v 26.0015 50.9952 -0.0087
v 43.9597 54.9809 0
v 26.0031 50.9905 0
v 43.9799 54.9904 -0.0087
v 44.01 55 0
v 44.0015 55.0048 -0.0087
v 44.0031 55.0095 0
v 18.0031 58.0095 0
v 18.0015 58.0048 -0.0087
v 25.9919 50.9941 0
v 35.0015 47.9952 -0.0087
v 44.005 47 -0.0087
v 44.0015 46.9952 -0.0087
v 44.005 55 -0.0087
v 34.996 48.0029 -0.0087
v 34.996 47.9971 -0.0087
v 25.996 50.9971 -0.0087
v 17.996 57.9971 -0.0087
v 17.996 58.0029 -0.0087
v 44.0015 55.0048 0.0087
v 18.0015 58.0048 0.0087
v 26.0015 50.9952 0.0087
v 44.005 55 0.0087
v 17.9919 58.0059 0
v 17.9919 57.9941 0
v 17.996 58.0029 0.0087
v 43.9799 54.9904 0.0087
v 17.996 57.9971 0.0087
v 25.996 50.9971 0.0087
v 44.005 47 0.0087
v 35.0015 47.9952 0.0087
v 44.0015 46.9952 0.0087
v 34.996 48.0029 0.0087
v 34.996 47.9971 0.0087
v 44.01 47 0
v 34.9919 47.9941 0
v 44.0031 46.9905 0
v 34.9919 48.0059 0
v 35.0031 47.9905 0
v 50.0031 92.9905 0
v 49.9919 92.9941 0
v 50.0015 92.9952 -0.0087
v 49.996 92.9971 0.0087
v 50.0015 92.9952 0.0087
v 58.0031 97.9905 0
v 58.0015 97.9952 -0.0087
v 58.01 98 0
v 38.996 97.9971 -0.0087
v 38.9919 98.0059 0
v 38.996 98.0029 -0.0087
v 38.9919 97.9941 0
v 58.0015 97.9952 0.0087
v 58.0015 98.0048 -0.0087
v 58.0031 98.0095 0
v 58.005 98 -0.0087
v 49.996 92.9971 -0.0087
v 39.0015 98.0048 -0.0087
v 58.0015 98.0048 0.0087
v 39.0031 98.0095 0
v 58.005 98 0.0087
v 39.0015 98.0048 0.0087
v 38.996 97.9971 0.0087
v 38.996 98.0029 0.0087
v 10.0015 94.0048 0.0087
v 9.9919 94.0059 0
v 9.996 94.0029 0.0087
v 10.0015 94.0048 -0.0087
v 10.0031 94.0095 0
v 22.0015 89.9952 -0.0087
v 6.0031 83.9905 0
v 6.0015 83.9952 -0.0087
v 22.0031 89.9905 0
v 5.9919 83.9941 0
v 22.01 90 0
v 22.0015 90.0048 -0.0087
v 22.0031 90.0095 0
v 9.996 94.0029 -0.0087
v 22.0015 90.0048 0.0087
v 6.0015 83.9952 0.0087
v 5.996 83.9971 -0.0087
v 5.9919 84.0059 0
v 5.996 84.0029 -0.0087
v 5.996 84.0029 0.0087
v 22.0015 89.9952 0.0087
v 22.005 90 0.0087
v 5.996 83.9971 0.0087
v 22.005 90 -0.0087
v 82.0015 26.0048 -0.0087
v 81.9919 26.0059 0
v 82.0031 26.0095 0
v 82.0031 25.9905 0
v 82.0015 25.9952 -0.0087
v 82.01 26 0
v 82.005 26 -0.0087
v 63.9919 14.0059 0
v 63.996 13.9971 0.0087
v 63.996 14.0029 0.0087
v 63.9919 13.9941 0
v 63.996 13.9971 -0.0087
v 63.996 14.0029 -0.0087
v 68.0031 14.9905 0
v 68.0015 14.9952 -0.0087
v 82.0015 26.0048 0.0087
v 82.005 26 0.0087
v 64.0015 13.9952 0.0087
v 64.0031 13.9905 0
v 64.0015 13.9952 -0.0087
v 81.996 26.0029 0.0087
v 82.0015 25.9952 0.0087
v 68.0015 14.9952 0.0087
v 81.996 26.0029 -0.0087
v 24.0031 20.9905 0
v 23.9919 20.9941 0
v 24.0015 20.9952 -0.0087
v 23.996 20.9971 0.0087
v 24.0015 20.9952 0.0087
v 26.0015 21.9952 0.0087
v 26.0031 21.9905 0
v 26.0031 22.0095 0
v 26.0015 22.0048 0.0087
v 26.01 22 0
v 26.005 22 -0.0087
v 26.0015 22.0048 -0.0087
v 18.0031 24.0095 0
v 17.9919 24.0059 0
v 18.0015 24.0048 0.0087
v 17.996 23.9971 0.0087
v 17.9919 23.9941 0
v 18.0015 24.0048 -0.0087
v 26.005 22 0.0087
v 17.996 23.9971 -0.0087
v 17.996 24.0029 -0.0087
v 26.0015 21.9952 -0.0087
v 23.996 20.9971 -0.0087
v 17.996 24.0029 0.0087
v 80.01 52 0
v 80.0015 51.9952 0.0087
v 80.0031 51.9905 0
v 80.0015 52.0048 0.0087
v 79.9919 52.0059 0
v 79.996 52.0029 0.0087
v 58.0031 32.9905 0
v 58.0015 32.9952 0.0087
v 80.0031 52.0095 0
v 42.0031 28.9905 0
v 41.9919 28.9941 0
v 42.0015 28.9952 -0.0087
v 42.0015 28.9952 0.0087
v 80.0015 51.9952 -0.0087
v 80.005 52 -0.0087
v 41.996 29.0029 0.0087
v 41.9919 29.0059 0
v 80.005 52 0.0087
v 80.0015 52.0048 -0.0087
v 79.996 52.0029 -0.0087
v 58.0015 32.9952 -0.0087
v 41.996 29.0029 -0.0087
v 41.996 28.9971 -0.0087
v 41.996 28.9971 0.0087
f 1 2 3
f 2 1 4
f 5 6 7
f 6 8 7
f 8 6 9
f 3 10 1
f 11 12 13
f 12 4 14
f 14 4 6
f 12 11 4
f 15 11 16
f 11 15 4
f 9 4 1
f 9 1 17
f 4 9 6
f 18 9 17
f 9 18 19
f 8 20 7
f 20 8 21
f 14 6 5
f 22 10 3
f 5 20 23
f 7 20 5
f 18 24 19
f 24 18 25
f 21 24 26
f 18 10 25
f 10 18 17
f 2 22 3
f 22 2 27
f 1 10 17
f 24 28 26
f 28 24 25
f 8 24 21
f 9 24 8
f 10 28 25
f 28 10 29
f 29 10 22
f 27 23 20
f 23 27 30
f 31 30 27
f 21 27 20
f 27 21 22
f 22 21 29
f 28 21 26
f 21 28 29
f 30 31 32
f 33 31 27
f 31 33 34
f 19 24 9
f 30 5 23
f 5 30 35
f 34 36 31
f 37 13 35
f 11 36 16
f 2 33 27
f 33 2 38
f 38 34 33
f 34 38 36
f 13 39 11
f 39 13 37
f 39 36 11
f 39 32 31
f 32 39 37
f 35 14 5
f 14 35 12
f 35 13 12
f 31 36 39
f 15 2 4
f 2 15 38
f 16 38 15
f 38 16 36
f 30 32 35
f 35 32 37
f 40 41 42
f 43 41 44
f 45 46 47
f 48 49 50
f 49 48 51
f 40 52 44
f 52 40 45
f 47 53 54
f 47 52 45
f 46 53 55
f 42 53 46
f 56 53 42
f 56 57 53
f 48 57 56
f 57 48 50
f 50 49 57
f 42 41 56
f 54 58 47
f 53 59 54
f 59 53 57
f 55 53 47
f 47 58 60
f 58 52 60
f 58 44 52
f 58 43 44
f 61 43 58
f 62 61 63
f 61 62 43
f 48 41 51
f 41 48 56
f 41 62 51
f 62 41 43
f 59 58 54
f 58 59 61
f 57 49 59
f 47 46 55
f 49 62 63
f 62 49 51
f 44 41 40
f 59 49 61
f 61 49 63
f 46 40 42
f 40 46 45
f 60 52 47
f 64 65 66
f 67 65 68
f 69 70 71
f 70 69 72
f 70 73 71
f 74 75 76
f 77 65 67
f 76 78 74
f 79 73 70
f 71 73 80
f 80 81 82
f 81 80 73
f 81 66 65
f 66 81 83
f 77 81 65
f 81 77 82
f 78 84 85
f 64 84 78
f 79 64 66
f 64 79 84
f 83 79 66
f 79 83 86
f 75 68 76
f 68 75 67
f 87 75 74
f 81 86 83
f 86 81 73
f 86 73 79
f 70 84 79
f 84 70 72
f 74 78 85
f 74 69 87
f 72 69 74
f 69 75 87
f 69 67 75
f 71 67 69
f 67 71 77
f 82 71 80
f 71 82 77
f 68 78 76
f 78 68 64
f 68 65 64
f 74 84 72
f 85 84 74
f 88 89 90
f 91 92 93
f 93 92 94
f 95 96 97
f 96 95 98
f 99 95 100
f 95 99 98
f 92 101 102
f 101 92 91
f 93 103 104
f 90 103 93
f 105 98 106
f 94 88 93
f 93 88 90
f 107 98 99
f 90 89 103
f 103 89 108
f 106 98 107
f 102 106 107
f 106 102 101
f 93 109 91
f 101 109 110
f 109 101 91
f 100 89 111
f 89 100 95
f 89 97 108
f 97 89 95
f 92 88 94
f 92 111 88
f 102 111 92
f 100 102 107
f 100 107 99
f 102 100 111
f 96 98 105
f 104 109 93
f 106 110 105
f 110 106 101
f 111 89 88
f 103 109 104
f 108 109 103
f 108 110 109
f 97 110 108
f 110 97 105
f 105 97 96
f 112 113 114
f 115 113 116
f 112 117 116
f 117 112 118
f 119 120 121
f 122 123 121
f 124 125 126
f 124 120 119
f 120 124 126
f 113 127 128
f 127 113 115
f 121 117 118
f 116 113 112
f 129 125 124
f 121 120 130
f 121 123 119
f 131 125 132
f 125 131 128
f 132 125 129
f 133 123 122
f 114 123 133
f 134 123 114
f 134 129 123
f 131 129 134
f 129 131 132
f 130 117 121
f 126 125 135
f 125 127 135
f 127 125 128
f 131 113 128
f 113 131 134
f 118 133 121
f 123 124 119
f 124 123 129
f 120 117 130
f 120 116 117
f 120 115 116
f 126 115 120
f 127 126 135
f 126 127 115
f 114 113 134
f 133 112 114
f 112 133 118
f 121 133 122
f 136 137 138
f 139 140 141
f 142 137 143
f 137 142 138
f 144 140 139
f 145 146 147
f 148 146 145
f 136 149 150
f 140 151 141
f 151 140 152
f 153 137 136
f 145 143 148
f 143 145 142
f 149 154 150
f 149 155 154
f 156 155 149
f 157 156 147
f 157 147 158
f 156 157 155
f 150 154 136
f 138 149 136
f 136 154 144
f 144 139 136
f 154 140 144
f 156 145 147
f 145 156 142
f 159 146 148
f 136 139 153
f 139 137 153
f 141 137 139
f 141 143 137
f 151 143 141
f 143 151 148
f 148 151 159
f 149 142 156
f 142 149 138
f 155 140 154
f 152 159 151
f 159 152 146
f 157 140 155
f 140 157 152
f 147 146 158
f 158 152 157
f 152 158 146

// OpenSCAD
color([0.2278310863752765,0.39116257101413354,0.8359006573178277]) hull(){
    translate([18,58]) sphere(0.01);
    translate([26,51]) sphere(0.01);
    translate([44,55]) sphere(0.01);
}
color([0.9275509141136953,0.4945515554541642,0.2994627149710676]) hull(){
    translate([44,55]) sphere(0.01);
    translate([44,47]) sphere(0.01);
    translate([35,48]) sphere(0.01);
}
color([0.8311623584410499,0.3533344893306992,0.3670289447663361]) hull(){
    translate([58,98]) sphere(0.01);
    translate([50,93]) sphere(0.01);
    translate([39,98]) sphere(0.01);
}
color([0.023586171104486242,0.48292274608747476,0.1530352134847689]) hull(){
    translate([22,90]) sphere(0.01);
    translate([10,94]) sphere(0.01);
    translate([6,84]) sphere(0.01);
}
color([0.6951940875874837,0.6700752406089181,0.25289775495491995]) hull(){
    translate([64,14]) sphere(0.01);
    translate([68,15]) sphere(0.01);
    translate([82,26]) sphere(0.01);
}
color([0.2852482428664679,0.9642307357683845,0.6929007469880472]) hull(){
    translate([26,22]) sphere(0.01);
    translate([18,24]) sphere(0.01);
    translate([24,21]) sphere(0.01);
}
color([0.6131203027915494,0.49639292088161324,0.24464389052477542]) hull(){
    translate([58,33]) sphere(0.01);
    translate([42,29]) sphere(0.01);
    translate([80,52]) sphere(0.01);
}
